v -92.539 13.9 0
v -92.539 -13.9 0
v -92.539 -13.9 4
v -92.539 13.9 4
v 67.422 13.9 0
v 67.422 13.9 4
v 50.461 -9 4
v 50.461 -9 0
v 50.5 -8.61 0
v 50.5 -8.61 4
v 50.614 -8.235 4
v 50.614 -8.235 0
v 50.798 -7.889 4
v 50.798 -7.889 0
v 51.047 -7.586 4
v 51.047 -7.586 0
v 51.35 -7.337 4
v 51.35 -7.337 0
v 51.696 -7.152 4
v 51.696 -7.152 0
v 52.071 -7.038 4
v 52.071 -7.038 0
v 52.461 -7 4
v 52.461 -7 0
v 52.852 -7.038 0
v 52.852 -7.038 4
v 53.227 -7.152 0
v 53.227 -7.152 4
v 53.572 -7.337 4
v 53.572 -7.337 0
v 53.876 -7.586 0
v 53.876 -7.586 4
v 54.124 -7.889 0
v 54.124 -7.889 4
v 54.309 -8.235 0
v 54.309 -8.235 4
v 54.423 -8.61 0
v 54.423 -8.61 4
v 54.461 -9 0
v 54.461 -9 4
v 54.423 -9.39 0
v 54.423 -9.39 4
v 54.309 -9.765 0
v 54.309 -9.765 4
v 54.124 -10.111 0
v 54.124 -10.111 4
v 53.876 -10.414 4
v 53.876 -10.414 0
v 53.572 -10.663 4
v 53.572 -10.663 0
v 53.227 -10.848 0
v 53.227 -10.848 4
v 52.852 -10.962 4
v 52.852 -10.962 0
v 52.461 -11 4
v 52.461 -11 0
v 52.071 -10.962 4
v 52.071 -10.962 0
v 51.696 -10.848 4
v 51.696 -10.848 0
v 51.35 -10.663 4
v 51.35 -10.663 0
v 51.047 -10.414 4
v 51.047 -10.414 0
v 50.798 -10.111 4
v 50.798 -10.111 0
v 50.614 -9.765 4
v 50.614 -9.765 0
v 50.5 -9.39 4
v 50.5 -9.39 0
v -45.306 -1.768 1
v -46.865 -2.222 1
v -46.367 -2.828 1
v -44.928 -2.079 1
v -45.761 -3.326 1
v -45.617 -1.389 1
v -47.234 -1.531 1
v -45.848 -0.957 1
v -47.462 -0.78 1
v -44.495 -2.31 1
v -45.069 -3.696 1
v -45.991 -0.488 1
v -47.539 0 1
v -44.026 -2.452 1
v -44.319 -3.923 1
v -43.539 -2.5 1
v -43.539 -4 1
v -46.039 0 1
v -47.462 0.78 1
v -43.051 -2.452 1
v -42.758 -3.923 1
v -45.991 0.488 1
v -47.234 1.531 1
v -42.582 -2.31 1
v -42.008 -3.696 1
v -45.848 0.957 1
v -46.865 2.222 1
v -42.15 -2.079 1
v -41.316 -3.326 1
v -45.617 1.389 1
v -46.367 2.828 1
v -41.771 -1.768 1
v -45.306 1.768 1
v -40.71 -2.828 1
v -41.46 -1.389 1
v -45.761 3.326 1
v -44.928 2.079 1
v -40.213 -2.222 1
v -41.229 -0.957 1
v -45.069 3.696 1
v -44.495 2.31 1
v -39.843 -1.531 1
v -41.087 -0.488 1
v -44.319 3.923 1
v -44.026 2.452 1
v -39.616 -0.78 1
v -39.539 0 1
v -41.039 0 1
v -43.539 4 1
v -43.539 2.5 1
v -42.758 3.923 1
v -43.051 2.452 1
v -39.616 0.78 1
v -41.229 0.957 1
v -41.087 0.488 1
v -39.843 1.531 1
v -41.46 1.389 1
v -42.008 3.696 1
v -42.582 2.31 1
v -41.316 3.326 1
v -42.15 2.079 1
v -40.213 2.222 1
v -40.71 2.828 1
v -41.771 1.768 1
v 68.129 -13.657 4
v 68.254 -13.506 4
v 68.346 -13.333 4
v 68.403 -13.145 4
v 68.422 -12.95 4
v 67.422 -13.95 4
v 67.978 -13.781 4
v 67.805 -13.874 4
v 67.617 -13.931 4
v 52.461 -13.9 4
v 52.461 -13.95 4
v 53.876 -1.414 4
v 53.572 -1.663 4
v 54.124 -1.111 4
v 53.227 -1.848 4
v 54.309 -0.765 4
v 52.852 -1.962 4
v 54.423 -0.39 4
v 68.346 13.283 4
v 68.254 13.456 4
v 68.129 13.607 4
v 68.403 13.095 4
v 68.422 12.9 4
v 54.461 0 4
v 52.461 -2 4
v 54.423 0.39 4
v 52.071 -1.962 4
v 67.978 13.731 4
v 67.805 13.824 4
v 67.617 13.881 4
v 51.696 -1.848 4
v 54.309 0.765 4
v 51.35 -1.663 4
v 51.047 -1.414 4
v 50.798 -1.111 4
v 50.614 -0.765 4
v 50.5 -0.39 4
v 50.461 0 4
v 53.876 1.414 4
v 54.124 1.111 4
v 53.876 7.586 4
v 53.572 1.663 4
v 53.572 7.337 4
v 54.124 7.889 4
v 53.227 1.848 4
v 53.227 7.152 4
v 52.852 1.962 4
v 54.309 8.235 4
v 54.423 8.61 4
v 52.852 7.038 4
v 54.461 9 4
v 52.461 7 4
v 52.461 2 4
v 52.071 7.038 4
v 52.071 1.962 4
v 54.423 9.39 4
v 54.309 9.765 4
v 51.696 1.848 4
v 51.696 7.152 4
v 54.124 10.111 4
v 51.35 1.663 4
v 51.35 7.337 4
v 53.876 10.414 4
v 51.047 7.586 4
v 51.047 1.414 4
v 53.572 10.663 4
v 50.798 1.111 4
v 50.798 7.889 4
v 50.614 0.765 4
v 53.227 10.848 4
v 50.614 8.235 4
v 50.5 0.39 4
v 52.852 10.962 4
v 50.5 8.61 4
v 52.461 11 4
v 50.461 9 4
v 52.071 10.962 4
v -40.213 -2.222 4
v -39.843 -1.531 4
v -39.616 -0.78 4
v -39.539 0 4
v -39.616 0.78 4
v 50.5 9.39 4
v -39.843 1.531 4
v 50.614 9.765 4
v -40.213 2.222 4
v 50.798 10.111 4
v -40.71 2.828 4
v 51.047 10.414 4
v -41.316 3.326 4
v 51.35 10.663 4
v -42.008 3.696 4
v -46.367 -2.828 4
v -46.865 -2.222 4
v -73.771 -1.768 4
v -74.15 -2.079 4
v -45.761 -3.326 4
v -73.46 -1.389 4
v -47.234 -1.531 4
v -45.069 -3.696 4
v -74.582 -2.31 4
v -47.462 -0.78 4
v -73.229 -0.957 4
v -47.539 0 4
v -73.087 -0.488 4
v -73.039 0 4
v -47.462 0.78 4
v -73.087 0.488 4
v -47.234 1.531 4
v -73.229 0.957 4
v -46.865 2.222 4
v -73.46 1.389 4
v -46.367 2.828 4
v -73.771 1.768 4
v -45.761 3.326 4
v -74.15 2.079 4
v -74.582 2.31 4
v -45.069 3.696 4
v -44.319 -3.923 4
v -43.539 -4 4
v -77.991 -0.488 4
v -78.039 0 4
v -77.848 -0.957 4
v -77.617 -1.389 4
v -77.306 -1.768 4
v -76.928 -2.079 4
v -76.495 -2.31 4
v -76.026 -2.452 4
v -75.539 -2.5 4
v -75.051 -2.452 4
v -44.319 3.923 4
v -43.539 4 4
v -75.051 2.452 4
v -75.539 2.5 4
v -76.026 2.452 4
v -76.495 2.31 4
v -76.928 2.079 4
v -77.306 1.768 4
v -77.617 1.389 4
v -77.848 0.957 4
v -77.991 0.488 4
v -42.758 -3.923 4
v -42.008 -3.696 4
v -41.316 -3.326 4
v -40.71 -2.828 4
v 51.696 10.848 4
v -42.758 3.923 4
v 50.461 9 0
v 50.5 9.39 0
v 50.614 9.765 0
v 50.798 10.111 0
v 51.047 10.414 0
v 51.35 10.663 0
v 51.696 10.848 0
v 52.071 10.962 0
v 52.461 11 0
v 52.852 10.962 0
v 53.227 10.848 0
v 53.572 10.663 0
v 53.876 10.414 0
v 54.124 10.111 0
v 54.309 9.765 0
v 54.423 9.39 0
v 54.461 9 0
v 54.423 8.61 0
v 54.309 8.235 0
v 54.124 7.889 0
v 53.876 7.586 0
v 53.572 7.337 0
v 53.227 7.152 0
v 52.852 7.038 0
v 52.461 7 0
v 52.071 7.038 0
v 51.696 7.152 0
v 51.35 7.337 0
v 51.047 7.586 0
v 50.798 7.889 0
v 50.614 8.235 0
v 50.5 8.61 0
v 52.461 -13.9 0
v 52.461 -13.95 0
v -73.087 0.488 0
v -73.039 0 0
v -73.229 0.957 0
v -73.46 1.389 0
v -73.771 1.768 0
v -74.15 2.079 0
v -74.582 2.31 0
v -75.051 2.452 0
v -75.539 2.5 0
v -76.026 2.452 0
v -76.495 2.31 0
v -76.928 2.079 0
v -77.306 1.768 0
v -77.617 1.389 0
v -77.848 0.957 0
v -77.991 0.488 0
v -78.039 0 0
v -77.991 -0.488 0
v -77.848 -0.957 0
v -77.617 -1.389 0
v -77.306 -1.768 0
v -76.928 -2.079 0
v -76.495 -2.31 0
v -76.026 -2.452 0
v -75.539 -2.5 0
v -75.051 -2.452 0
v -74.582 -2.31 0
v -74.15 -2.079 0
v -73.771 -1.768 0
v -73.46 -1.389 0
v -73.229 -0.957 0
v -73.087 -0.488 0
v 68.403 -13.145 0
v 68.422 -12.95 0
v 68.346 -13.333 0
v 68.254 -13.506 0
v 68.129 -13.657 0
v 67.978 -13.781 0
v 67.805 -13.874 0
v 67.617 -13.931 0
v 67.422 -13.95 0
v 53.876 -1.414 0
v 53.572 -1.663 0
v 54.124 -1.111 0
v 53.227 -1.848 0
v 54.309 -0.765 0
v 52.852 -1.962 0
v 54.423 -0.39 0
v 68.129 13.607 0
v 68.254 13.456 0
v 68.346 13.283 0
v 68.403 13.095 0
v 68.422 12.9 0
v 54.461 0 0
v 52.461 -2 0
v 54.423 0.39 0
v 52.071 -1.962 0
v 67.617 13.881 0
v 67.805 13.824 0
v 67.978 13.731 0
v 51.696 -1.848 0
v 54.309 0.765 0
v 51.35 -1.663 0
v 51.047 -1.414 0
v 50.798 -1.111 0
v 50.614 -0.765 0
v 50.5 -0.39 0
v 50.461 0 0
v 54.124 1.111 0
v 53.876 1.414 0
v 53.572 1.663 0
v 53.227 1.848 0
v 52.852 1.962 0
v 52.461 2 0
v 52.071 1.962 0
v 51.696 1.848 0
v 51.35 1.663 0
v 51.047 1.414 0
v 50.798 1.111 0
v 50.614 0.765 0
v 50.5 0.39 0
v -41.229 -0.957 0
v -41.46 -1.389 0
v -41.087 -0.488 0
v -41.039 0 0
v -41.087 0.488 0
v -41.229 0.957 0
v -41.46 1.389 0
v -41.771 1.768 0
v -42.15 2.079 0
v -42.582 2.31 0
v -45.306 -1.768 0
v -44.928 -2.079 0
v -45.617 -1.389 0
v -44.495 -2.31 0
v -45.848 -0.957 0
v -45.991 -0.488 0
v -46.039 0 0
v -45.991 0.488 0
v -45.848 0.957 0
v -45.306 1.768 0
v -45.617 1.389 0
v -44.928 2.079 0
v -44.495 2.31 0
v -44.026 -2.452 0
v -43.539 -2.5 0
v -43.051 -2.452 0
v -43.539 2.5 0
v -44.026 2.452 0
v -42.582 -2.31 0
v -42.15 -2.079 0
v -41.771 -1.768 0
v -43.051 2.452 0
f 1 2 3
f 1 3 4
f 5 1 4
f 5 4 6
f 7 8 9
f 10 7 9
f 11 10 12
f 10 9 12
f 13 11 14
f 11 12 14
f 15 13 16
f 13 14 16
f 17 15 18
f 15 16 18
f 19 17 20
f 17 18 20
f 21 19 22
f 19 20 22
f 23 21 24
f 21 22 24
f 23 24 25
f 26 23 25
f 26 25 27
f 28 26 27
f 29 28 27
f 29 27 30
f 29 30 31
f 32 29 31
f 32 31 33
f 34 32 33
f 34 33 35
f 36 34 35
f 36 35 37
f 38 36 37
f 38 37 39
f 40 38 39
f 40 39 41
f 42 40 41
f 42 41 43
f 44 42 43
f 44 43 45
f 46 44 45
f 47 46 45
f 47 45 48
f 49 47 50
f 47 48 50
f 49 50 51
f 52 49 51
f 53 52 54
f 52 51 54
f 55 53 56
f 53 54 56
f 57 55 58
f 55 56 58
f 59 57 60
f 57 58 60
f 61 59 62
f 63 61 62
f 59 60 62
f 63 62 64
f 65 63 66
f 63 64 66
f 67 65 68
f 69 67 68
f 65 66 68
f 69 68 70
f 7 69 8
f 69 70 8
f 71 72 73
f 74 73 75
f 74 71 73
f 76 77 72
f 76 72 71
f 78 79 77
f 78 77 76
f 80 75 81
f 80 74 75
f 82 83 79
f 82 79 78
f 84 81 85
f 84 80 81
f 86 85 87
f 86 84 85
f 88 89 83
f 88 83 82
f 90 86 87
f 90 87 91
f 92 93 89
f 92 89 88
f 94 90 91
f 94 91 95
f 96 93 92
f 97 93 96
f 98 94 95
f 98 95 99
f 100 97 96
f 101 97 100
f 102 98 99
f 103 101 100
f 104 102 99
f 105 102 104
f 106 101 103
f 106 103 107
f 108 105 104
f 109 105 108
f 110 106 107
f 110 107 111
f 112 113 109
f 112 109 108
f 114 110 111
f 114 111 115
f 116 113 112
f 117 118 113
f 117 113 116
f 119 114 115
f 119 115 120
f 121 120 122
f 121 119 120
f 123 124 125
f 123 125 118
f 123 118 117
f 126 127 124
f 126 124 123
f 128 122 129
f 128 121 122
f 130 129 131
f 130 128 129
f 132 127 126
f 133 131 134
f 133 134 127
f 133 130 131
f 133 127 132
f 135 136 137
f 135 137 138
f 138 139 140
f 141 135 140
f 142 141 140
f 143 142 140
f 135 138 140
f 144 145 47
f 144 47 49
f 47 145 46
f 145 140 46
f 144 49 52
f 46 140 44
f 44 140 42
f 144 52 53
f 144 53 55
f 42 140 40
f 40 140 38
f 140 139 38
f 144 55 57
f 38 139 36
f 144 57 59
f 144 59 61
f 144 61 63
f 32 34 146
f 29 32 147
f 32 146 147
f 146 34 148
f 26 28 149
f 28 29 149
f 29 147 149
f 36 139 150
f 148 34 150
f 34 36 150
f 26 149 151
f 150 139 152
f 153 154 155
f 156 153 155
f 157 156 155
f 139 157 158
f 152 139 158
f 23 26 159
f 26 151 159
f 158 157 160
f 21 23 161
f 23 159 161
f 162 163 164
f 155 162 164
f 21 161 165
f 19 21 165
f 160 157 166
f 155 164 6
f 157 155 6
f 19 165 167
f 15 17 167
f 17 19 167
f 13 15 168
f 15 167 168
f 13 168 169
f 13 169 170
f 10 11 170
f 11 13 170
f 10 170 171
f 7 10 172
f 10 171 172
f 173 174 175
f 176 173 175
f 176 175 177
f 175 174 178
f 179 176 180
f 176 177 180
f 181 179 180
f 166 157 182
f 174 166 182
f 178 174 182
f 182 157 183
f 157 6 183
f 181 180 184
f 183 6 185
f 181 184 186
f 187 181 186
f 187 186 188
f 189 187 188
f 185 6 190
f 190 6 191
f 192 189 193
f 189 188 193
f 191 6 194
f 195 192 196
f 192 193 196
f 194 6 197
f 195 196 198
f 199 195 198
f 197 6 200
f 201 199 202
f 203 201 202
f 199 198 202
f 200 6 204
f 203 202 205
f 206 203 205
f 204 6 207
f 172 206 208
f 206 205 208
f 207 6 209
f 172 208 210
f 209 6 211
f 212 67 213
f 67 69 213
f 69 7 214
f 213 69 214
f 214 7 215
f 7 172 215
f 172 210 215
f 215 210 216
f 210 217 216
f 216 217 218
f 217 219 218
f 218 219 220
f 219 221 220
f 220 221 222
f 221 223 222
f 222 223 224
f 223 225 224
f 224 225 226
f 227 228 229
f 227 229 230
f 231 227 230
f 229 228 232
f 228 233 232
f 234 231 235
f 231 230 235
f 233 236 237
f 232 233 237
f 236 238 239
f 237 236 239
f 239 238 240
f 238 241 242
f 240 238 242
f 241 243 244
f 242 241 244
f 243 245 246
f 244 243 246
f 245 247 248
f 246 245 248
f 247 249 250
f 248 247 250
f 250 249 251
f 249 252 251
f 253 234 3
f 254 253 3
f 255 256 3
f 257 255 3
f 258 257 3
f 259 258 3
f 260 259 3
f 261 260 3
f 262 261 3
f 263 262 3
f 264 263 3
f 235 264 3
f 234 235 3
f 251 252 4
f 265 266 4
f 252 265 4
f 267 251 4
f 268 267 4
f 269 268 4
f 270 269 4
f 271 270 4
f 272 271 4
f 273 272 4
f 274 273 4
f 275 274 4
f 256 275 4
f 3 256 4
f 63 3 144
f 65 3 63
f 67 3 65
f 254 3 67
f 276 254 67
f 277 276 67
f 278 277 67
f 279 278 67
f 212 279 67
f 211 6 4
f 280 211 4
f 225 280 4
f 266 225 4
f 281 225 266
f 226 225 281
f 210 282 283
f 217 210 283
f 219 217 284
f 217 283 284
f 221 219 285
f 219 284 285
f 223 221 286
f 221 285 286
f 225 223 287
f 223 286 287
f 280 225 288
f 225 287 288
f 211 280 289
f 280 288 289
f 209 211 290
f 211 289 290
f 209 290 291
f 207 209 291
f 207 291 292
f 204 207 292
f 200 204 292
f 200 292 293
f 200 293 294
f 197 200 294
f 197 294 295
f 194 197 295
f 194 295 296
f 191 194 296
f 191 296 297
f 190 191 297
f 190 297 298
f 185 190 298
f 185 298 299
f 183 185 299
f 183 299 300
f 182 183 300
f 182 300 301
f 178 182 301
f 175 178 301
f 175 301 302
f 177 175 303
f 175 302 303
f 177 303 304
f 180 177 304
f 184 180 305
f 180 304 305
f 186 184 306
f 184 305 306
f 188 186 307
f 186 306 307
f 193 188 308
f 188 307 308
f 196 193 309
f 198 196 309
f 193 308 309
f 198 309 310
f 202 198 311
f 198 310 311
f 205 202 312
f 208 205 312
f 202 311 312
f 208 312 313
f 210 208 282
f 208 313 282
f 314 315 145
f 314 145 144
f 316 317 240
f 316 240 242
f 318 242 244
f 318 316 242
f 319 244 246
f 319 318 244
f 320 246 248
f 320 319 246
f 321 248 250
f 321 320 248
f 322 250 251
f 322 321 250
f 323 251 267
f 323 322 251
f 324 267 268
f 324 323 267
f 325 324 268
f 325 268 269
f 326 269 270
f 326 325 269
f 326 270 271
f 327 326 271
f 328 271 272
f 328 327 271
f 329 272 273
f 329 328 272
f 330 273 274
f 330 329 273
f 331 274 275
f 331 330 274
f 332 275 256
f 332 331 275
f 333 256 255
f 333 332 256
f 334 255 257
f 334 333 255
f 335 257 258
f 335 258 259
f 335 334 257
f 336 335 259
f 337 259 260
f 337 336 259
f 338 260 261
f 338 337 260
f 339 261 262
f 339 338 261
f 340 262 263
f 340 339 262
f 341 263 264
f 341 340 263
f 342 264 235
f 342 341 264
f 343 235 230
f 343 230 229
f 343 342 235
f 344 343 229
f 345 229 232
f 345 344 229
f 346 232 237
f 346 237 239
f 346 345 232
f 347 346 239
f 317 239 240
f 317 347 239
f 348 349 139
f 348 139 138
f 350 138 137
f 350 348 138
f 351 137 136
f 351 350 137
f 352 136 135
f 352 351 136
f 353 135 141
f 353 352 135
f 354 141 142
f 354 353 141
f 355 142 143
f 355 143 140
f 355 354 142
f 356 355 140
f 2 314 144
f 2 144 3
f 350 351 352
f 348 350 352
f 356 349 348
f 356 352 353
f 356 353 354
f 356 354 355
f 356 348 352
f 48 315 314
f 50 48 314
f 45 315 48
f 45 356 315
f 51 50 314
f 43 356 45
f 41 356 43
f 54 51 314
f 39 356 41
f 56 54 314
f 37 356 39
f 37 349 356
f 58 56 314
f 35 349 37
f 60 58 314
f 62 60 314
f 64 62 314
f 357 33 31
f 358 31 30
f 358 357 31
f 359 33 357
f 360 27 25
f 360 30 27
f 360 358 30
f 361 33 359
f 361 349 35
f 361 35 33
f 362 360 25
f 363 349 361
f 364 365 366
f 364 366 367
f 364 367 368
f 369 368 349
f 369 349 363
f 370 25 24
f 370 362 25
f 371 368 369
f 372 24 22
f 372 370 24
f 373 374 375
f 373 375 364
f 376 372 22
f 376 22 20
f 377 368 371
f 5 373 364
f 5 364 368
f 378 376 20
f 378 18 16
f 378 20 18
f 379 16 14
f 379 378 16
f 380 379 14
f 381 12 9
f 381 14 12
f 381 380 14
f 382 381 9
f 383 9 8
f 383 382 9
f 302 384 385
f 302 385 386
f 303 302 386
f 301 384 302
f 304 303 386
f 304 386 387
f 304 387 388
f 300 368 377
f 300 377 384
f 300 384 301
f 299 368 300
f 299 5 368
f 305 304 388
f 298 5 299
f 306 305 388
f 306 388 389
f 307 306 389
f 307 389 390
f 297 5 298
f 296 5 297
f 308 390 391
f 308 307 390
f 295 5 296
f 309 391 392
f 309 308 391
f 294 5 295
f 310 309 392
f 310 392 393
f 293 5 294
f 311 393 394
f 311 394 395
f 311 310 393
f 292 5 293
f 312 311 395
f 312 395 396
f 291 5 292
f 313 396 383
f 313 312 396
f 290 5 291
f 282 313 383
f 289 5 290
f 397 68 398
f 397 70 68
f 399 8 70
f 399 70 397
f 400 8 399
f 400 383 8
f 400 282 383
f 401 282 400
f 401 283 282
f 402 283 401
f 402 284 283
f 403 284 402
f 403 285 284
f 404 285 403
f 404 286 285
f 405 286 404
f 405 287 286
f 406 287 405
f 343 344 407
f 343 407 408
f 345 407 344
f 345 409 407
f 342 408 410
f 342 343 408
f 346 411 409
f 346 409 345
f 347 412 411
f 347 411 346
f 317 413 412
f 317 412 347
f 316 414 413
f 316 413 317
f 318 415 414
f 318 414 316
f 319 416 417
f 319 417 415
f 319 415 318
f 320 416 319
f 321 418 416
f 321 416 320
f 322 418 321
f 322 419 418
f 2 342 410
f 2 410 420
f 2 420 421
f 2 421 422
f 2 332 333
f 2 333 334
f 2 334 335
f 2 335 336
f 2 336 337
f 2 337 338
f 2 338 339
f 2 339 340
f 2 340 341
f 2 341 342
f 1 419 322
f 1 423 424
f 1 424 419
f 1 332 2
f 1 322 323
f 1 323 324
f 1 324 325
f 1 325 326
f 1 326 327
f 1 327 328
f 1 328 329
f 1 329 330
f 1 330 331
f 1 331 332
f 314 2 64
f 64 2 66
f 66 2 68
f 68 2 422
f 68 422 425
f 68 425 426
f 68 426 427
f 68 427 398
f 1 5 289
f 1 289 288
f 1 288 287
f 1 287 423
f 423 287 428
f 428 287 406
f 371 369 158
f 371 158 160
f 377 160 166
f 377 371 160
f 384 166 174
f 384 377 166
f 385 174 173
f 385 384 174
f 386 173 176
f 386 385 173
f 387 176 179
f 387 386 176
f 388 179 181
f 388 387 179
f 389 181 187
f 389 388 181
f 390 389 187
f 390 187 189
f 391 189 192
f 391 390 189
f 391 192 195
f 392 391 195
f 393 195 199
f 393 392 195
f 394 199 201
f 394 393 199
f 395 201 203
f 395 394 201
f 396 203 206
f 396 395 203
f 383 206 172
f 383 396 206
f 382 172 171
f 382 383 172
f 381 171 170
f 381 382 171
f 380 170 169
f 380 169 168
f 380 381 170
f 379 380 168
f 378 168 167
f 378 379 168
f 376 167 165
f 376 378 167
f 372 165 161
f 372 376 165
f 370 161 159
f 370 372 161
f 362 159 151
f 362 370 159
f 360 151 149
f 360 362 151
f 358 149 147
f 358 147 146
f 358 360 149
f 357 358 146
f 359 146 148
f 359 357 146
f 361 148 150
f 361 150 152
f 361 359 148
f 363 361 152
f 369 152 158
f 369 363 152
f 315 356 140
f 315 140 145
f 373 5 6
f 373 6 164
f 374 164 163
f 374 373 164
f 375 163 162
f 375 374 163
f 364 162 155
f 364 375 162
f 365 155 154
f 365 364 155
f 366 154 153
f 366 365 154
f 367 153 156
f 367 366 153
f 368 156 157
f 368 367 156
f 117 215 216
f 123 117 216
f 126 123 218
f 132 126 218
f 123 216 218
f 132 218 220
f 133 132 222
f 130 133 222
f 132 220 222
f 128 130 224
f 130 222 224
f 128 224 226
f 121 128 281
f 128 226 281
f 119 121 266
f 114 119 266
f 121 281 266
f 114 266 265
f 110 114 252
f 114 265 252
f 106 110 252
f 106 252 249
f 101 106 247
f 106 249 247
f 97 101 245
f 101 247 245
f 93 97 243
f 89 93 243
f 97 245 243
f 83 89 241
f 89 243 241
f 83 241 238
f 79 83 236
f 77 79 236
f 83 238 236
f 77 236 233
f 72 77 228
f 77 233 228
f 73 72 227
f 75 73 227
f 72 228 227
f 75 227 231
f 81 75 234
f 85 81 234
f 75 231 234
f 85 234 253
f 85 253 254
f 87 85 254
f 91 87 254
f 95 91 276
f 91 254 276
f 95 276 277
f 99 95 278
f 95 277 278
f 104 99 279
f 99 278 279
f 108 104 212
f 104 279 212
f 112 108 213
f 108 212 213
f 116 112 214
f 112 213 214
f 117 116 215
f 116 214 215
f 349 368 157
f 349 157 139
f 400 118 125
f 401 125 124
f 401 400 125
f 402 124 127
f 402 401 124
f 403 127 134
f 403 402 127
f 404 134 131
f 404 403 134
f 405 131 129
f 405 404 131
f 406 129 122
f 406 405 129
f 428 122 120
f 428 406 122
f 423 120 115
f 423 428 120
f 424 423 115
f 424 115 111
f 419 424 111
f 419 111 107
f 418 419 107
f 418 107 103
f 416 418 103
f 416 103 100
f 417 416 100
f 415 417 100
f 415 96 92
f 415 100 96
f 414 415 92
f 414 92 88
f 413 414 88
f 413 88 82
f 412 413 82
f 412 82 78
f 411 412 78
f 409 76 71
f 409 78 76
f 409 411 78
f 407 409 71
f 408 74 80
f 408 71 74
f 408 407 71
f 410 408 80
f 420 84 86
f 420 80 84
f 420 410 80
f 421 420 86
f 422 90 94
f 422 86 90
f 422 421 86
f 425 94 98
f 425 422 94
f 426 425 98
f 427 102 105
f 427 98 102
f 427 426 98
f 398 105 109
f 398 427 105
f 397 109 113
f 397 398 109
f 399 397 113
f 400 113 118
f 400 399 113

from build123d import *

# Parameters (mm, degrees)
SKETCH_1_R          = 2.5
SKETCH_1_R_2        = 2
EXTRUDE_1_DEPTH     = 4
SKETCH_2_R          = 2
CUT_EXTRUDE_1_DEPTH = 10
SKETCH_4_R          = 4
CUT_EXTRUDE_2_DEPTH = 3


with BuildPart() as part:
    # 草图1 → 凸台-拉伸1 (new body)
    with BuildSketch(Plane.XY):
        with BuildLine():
            Line((-75.538677918, 13.9), (52.461322082, 13.9))
            Line((52.461322082, 13.9), (65.422072845, 13.9))
            Line((65.422072845, 13.9), (67.422072845, 13.9))
            ThreePointArc((67.422072845, 13.9), (68.129179626, 13.607106781), (68.422072845, 12.9))
            Line((68.422072845, 12.9), (68.422072845, 10.9))
            Line((68.422072845, 10.9), (68.422072845, -12.95))
            ThreePointArc((68.422072845, -12.95), (68.129179626, -13.657106781), (67.422072845, -13.95))
            Line((67.422072845, -13.95), (52.461322082, -13.95))
            Line((52.461322082, -13.95), (52.461322082, -13.9))
            Line((52.461322082, -13.9), (-75.538677918, -13.9))
            Line((-75.538677918, -13.9), (-92.538677918, -13.9))
            Line((-92.538677918, -13.9), (-92.538677918, 13.9))
            Line((-92.538677918, 13.9), (-75.538677918, 13.9))
        make_face()
        with Locations((-75.538677918, 0)):
            Circle(SKETCH_1_R, mode=Mode.SUBTRACT)
        with Locations((52.461322082, 0)):
            Circle(SKETCH_1_R_2, mode=Mode.SUBTRACT)
        with Locations((-43.538677918, 0)):
            Circle(SKETCH_1_R, mode=Mode.SUBTRACT)
    extrude(amount=EXTRUDE_1_DEPTH)

    # 草图2 → 切除-拉伸1 (cut)
    with BuildSketch(Plane(origin=(0, 0, 0), x_dir=(-1, 0, 0), z_dir=(0, 0, -1))):
        with Locations((-52.461322082, -9)):
            Circle(SKETCH_2_R)
        with Locations((-52.461322082, 9)):
            Circle(SKETCH_2_R)
    extrude(amount=-CUT_EXTRUDE_1_DEPTH, mode=Mode.SUBTRACT)

    # 草图4 → 切除-拉伸2 (cut)
    with BuildSketch(Plane.XY.offset(4)):
        with Locations((-43.538677918, 0)):
            Circle(SKETCH_4_R)
    extrude(amount=-CUT_EXTRUDE_2_DEPTH, mode=Mode.SUBTRACT)


solid = part.part
